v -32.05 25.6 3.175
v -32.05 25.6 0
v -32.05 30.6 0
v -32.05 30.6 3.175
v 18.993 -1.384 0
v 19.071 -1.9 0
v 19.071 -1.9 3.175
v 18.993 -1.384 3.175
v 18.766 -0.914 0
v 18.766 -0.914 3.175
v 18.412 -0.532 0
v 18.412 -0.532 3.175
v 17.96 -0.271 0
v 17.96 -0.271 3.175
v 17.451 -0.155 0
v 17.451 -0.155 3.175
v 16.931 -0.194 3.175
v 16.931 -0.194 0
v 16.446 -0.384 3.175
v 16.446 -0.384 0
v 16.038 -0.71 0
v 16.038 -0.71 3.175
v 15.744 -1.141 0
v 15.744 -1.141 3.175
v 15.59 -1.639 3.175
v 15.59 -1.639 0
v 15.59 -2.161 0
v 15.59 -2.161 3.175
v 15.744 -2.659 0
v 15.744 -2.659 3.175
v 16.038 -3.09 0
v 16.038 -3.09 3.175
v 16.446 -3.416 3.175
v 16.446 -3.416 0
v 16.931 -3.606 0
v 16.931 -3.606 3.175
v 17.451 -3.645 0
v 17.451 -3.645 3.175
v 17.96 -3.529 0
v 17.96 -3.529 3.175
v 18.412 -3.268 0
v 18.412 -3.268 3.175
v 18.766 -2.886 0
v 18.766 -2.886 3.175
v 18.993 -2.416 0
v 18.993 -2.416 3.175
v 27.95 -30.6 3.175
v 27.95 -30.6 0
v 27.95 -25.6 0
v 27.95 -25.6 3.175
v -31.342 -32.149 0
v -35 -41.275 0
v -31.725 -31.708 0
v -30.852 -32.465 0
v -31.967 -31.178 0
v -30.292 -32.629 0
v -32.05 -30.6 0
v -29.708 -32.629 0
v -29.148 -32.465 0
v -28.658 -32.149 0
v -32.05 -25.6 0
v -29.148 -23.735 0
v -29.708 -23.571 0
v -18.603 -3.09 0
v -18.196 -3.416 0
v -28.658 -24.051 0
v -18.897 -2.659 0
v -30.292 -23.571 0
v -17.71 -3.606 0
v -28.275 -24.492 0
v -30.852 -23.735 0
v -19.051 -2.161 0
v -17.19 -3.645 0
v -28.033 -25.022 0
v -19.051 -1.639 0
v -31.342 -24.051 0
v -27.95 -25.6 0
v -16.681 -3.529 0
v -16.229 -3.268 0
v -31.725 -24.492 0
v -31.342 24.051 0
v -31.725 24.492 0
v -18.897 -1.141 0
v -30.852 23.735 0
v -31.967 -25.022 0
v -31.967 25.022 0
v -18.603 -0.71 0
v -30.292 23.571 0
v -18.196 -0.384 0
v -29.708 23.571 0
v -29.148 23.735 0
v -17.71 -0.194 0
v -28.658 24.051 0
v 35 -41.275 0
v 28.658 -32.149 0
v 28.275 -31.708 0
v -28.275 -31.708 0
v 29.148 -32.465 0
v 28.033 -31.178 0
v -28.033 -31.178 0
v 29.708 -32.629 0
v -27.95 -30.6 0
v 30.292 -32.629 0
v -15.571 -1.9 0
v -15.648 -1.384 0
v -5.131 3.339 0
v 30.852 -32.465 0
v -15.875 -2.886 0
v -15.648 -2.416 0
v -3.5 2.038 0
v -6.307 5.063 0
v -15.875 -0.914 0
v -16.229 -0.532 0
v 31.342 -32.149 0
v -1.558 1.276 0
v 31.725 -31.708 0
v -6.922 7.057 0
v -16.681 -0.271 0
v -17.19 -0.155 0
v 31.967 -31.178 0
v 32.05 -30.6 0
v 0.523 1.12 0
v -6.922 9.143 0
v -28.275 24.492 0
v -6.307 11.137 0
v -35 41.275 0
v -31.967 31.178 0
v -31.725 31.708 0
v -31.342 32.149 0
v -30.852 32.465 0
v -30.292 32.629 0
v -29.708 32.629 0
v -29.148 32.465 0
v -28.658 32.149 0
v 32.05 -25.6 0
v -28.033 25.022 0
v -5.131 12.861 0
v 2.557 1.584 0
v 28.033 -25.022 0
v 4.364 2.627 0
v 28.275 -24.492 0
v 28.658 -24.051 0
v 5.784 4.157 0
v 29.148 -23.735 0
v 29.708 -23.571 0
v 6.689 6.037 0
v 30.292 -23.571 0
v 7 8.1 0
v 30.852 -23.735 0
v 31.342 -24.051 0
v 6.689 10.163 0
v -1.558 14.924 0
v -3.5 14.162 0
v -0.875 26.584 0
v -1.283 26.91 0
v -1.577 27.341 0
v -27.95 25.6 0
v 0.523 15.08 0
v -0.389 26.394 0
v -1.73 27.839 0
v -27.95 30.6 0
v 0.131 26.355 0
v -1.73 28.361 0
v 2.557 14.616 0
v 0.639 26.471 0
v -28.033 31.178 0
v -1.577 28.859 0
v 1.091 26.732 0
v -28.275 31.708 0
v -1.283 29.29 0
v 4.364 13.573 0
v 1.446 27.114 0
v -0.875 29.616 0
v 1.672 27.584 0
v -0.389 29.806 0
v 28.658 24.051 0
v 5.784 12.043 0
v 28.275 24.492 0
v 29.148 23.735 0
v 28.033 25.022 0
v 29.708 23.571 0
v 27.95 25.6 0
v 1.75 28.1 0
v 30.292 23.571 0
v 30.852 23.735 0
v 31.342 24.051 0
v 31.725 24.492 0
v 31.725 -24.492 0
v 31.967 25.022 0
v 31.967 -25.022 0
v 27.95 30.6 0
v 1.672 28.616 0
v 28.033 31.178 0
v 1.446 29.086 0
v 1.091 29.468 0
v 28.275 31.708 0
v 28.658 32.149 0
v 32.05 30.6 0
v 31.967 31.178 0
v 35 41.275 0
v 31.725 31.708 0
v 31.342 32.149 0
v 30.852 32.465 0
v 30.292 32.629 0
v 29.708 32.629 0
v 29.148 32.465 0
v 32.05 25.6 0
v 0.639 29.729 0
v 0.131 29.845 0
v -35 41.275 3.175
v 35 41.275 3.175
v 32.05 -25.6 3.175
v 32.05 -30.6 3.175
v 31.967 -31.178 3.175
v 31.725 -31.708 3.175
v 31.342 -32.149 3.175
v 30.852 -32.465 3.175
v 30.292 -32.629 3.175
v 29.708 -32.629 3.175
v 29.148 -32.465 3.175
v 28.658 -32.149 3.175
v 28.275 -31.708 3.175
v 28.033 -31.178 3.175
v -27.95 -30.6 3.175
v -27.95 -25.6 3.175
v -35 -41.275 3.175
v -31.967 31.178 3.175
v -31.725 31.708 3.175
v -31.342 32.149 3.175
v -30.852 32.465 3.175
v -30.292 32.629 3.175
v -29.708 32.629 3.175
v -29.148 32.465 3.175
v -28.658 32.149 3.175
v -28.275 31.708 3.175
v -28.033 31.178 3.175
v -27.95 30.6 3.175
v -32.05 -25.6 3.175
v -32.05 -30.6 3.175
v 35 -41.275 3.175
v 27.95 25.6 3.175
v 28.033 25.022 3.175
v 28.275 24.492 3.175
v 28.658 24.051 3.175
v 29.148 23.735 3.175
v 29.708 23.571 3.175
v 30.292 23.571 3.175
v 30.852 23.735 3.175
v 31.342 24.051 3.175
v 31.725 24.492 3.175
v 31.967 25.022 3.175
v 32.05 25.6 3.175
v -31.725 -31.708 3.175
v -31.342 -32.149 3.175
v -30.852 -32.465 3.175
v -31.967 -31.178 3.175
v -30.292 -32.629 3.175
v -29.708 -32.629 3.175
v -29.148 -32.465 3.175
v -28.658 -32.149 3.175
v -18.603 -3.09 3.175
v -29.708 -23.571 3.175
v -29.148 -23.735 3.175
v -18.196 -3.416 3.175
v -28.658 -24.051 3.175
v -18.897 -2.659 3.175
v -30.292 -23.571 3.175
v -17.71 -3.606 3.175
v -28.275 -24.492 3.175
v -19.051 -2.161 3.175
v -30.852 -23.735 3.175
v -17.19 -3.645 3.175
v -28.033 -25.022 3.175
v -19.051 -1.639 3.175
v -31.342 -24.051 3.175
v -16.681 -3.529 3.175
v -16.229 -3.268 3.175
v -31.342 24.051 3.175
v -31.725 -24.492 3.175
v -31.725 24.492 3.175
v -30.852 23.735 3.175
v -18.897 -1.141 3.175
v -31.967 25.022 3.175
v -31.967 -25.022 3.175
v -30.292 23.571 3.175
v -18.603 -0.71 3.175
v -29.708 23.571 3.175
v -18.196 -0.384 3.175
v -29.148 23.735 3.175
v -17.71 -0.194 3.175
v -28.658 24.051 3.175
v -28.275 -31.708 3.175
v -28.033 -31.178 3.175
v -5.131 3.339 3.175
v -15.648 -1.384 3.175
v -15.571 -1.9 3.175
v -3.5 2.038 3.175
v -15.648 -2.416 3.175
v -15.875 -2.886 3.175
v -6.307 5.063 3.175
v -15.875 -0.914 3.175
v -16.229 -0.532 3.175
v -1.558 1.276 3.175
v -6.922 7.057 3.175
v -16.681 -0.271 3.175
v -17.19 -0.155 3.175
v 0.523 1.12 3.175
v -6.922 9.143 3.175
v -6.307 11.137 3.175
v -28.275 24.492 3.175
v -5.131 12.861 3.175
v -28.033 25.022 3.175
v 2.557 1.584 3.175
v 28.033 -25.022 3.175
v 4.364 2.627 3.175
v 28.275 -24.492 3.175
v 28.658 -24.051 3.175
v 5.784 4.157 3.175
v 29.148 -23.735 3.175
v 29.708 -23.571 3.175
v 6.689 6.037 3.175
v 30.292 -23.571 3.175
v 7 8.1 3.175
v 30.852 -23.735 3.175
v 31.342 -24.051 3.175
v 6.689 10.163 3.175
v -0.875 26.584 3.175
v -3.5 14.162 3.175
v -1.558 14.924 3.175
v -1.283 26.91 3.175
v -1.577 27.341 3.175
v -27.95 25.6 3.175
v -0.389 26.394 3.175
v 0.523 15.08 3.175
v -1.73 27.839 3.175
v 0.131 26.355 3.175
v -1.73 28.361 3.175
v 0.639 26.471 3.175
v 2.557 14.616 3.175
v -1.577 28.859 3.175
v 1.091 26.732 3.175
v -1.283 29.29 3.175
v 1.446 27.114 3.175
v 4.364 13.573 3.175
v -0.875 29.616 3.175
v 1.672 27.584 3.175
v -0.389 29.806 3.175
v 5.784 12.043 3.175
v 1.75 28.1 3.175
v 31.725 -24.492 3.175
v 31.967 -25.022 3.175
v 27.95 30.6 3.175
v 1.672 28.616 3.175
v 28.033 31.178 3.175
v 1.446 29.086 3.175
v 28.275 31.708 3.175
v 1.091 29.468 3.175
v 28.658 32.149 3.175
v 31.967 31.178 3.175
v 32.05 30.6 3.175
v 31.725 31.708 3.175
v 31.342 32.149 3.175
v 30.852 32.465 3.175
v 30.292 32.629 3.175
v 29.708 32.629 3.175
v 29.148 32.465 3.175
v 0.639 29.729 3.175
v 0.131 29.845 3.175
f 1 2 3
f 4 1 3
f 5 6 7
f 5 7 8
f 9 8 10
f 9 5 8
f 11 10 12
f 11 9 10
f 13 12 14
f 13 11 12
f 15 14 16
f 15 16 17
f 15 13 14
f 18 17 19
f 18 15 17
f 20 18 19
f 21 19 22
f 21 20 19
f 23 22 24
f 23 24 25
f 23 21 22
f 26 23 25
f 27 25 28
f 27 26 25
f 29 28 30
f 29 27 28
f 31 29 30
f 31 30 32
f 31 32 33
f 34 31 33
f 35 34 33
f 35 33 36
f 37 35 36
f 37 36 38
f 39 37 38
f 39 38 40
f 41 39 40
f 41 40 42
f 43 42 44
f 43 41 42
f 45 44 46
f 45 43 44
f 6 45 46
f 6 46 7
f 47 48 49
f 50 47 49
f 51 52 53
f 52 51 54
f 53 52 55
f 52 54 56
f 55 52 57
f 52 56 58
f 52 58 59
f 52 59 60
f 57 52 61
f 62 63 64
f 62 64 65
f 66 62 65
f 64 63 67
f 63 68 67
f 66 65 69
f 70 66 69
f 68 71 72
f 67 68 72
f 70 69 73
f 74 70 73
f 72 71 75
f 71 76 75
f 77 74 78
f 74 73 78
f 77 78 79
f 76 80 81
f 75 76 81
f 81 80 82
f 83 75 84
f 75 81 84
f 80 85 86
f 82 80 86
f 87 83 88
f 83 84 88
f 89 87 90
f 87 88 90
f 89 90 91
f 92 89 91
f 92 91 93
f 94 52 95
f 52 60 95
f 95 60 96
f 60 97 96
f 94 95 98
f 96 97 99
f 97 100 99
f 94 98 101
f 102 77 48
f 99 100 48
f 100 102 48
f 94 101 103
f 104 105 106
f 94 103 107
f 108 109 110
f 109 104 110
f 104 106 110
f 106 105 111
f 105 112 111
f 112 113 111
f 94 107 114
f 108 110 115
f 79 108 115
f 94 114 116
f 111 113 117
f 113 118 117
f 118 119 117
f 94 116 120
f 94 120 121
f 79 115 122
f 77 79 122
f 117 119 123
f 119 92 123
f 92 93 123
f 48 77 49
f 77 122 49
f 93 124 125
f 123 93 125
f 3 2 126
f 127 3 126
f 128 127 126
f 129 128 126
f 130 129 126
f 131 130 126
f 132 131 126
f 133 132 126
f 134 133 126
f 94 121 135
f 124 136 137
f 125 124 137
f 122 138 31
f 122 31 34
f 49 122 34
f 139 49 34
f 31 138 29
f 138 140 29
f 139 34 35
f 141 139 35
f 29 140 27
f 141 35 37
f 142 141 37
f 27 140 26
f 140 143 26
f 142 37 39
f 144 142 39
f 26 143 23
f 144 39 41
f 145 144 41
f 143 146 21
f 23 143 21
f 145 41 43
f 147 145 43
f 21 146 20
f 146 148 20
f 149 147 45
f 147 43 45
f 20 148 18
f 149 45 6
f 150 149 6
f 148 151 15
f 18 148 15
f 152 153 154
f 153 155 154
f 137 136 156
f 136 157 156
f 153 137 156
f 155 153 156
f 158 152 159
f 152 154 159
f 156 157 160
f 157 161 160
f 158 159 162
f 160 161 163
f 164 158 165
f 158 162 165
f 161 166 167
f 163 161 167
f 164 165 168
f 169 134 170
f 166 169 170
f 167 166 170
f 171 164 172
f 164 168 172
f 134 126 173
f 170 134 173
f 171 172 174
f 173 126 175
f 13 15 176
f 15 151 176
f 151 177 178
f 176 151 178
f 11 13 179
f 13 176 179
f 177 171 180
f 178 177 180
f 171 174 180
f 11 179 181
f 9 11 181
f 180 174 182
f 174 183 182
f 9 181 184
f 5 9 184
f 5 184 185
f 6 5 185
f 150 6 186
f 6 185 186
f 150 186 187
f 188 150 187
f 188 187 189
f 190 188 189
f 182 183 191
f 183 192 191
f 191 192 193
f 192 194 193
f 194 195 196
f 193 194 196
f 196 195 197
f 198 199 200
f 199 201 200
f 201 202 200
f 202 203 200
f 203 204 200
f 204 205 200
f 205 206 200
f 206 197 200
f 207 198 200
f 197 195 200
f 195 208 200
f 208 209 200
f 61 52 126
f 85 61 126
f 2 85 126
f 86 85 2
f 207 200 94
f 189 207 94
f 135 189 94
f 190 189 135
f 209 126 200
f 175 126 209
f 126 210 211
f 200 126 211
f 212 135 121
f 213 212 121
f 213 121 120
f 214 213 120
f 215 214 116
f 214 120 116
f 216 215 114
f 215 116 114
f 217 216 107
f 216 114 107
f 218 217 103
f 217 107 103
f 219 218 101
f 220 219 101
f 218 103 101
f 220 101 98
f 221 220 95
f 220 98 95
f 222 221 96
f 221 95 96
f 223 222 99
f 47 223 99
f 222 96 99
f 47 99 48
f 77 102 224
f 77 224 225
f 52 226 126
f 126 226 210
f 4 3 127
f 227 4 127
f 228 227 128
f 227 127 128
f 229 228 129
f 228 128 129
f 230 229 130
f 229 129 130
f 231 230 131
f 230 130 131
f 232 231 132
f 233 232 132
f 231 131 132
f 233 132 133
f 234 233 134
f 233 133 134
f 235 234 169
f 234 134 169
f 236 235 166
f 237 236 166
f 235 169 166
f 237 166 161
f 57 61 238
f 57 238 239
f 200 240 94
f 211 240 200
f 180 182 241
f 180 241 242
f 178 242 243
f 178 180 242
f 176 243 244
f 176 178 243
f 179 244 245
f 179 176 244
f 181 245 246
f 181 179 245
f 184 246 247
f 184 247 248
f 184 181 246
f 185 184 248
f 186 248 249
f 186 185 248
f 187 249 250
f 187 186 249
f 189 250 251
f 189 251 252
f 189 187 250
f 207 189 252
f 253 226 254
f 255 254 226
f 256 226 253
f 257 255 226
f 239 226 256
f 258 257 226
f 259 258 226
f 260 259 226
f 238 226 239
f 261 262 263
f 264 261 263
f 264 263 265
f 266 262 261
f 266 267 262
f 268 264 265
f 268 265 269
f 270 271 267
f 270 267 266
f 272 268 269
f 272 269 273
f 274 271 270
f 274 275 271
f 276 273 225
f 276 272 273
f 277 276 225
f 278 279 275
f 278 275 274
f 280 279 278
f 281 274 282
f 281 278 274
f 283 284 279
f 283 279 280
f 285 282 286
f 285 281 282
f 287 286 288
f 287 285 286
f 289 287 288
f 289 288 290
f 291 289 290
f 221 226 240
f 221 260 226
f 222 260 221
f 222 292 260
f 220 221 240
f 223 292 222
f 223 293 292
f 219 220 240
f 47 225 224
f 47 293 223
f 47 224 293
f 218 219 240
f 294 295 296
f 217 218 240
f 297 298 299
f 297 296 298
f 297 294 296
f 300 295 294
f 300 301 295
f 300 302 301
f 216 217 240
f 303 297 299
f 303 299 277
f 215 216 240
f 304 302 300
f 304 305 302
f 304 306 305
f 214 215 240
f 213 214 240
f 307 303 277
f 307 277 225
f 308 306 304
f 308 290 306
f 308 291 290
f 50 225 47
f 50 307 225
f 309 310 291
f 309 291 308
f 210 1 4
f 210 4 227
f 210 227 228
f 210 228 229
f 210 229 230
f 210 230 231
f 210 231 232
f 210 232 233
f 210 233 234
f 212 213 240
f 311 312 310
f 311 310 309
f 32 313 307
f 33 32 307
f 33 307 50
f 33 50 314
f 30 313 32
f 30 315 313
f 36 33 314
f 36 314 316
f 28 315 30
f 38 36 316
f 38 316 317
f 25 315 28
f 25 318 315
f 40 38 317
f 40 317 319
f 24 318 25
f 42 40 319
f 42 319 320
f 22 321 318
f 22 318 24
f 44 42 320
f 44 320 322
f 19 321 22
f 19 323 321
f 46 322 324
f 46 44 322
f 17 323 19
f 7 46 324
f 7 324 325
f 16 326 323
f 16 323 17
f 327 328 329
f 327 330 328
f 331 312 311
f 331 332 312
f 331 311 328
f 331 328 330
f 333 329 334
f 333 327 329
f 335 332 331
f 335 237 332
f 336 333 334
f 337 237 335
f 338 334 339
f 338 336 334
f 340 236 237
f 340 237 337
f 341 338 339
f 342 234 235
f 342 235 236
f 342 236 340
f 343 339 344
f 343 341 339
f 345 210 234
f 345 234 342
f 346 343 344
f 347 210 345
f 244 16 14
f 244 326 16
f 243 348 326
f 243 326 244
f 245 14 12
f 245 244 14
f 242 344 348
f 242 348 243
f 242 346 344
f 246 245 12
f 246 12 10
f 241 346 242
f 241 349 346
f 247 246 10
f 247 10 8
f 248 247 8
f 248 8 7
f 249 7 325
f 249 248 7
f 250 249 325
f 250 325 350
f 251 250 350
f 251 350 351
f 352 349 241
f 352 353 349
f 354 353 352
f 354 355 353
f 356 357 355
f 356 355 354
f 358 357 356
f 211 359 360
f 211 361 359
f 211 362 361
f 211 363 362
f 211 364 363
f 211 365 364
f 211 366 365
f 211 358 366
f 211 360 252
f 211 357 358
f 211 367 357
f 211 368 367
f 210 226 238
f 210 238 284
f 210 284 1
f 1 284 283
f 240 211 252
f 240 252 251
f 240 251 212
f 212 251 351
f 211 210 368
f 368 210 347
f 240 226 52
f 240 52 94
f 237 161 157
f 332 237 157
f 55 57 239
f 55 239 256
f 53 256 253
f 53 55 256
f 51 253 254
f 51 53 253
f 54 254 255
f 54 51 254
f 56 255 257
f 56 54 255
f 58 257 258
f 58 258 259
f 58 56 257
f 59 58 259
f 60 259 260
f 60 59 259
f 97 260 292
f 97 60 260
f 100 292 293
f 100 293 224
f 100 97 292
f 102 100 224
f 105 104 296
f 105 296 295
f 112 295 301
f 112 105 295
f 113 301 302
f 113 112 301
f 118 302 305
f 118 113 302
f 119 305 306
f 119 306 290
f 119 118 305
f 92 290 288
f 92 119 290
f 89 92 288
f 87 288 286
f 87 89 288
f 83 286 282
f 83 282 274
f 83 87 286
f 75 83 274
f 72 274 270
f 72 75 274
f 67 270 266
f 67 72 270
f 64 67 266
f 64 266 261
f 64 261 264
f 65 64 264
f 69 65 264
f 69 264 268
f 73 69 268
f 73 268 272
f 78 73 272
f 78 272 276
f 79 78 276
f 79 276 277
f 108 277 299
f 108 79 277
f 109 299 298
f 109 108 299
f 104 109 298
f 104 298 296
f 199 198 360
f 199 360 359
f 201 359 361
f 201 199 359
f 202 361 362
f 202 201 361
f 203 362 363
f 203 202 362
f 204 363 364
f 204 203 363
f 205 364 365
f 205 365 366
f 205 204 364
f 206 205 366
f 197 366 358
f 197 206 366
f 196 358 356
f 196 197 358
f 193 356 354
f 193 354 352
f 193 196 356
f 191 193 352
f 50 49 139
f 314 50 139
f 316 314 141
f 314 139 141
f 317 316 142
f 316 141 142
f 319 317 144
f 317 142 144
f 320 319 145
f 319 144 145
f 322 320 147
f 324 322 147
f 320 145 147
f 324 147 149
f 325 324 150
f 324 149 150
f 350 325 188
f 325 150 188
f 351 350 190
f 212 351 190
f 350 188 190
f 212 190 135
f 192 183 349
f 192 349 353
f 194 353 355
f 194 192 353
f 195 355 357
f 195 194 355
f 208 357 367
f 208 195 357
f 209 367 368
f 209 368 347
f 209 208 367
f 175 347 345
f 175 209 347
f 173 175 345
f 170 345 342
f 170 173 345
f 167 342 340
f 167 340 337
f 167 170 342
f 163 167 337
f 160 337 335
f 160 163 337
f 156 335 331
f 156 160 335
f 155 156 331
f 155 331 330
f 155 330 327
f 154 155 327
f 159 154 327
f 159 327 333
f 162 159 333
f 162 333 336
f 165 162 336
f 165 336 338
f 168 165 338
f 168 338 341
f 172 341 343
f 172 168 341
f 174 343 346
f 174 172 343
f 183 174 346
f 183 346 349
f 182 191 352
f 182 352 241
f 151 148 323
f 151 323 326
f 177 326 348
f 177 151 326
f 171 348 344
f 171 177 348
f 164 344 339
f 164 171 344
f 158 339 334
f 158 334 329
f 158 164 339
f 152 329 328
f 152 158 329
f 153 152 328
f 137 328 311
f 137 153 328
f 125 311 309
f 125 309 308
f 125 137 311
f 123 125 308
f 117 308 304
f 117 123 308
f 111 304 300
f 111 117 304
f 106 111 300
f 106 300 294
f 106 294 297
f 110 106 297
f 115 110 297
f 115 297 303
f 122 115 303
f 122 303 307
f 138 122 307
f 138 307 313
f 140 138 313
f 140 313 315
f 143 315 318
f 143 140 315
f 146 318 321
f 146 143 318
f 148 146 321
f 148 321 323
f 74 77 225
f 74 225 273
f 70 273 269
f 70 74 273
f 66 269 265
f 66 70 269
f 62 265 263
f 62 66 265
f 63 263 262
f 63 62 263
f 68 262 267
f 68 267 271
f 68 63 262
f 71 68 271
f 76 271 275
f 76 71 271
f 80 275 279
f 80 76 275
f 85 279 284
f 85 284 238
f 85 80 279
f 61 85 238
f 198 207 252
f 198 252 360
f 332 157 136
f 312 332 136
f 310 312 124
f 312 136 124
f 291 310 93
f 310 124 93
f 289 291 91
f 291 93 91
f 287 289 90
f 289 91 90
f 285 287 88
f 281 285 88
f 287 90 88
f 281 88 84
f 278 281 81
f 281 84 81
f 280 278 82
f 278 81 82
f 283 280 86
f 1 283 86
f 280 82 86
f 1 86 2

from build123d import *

# Parameters (mm, degrees)
SKETCH1_W           = 70
SKETCH1_H           = 76.2
SKETCH1_R           = 1.75
SKETCH1_R_2         = 7
BOSS_EXTRUDE1_DEPTH = 3.175
SKETCH3_W           = 70
SKETCH3_H           = 3.175
BOSS_EXTRUDE2_DEPTH = 3.175


with BuildPart() as part:
    # Sketch1 → Boss-Extrude1 (new body)
    with BuildSketch(Plane.XY):
        Rectangle(SKETCH1_W, SKETCH1_H)
        with Locations((0, 28.1)):
            Circle(SKETCH1_R, mode=Mode.SUBTRACT)
        with Locations((17.320508076, -1.9)):
            Circle(SKETCH1_R, mode=Mode.SUBTRACT)
        with Locations((-17.320508076, -1.9)):
            Circle(SKETCH1_R, mode=Mode.SUBTRACT)
        with Locations((0, 8.1)):
            Circle(SKETCH1_R_2, mode=Mode.SUBTRACT)
        with BuildLine():
            Line((-32.05, 25.6), (-32.05, 30.6))
            ThreePointArc((-32.05, 30.6), (-30, 32.65), (-27.95, 30.6))
            Line((-27.95, 30.6), (-27.95, 25.6))
            ThreePointArc((-27.95, 25.6), (-30, 23.55), (-32.05, 25.6))
        make_face(mode=Mode.SUBTRACT)
        with BuildLine():
            Line((32.05, 25.6), (32.05, 30.6))
            ThreePointArc((32.05, 30.6), (30, 32.65), (27.95, 30.6))
            Line((27.95, 30.6), (27.95, 25.6))
            ThreePointArc((27.95, 25.6), (30, 23.55), (32.05, 25.6))
        make_face(mode=Mode.SUBTRACT)
        with BuildLine():
            Line((-32.05, -25.6), (-32.05, -30.6))
            ThreePointArc((-32.05, -30.6), (-30, -32.65), (-27.95, -30.6))
            Line((-27.95, -30.6), (-27.95, -25.6))
            ThreePointArc((-27.95, -25.6), (-30, -23.55), (-32.05, -25.6))
        make_face(mode=Mode.SUBTRACT)
        with BuildLine():
            Line((32.05, -25.6), (32.05, -30.6))
            ThreePointArc((32.05, -30.6), (30, -32.65), (27.95, -30.6))
            Line((27.95, -30.6), (27.95, -25.6))
            ThreePointArc((27.95, -25.6), (30, -23.55), (32.05, -25.6))
        make_face(mode=Mode.SUBTRACT)
    extrude(amount=BOSS_EXTRUDE1_DEPTH)

    # Sketch3 → Boss-Extrude2 (add)
    with BuildSketch(Plane.XY.offset(3.175)):
        with Locations((0, 39.6875)):
            Rectangle(SKETCH3_W, SKETCH3_H)
        with Locations((0, -39.6875)):
            Rectangle(SKETCH3_W, SKETCH3_H)
    extrude(amount=-BOSS_EXTRUDE2_DEPTH)


solid = part.part
